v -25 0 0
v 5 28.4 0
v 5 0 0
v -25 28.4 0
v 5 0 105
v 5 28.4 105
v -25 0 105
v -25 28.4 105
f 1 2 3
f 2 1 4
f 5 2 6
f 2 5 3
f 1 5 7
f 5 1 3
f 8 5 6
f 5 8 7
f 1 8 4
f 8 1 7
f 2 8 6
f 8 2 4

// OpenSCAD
// Built by bench/smallmodels/features/compiler.py from a list of features.
$fn = 64;
difference() {
  union() {
    translate([0, 0, 0]) linear_extrude(height = 105) polygon([[0, 0], [5, 0], [5, 28.4], [-25, 28.4], [-25, 0]]);
  }
  union() {
    translate([42, 17.5, 0]) rotate([0, 0, 0]) translate([-9.2, -15, 0]) cube([18.4, 30, 105]);
    translate([42, 52.5, 0]) rotate([0, 0, 0]) translate([-9.2, -15, 0]) cube([18.4, 30, 105]);
    translate([42, 87.5, 0]) rotate([0, 0, 0]) translate([-9.2, -15, 0]) cube([18.4, 30, 105]);
  }
}
